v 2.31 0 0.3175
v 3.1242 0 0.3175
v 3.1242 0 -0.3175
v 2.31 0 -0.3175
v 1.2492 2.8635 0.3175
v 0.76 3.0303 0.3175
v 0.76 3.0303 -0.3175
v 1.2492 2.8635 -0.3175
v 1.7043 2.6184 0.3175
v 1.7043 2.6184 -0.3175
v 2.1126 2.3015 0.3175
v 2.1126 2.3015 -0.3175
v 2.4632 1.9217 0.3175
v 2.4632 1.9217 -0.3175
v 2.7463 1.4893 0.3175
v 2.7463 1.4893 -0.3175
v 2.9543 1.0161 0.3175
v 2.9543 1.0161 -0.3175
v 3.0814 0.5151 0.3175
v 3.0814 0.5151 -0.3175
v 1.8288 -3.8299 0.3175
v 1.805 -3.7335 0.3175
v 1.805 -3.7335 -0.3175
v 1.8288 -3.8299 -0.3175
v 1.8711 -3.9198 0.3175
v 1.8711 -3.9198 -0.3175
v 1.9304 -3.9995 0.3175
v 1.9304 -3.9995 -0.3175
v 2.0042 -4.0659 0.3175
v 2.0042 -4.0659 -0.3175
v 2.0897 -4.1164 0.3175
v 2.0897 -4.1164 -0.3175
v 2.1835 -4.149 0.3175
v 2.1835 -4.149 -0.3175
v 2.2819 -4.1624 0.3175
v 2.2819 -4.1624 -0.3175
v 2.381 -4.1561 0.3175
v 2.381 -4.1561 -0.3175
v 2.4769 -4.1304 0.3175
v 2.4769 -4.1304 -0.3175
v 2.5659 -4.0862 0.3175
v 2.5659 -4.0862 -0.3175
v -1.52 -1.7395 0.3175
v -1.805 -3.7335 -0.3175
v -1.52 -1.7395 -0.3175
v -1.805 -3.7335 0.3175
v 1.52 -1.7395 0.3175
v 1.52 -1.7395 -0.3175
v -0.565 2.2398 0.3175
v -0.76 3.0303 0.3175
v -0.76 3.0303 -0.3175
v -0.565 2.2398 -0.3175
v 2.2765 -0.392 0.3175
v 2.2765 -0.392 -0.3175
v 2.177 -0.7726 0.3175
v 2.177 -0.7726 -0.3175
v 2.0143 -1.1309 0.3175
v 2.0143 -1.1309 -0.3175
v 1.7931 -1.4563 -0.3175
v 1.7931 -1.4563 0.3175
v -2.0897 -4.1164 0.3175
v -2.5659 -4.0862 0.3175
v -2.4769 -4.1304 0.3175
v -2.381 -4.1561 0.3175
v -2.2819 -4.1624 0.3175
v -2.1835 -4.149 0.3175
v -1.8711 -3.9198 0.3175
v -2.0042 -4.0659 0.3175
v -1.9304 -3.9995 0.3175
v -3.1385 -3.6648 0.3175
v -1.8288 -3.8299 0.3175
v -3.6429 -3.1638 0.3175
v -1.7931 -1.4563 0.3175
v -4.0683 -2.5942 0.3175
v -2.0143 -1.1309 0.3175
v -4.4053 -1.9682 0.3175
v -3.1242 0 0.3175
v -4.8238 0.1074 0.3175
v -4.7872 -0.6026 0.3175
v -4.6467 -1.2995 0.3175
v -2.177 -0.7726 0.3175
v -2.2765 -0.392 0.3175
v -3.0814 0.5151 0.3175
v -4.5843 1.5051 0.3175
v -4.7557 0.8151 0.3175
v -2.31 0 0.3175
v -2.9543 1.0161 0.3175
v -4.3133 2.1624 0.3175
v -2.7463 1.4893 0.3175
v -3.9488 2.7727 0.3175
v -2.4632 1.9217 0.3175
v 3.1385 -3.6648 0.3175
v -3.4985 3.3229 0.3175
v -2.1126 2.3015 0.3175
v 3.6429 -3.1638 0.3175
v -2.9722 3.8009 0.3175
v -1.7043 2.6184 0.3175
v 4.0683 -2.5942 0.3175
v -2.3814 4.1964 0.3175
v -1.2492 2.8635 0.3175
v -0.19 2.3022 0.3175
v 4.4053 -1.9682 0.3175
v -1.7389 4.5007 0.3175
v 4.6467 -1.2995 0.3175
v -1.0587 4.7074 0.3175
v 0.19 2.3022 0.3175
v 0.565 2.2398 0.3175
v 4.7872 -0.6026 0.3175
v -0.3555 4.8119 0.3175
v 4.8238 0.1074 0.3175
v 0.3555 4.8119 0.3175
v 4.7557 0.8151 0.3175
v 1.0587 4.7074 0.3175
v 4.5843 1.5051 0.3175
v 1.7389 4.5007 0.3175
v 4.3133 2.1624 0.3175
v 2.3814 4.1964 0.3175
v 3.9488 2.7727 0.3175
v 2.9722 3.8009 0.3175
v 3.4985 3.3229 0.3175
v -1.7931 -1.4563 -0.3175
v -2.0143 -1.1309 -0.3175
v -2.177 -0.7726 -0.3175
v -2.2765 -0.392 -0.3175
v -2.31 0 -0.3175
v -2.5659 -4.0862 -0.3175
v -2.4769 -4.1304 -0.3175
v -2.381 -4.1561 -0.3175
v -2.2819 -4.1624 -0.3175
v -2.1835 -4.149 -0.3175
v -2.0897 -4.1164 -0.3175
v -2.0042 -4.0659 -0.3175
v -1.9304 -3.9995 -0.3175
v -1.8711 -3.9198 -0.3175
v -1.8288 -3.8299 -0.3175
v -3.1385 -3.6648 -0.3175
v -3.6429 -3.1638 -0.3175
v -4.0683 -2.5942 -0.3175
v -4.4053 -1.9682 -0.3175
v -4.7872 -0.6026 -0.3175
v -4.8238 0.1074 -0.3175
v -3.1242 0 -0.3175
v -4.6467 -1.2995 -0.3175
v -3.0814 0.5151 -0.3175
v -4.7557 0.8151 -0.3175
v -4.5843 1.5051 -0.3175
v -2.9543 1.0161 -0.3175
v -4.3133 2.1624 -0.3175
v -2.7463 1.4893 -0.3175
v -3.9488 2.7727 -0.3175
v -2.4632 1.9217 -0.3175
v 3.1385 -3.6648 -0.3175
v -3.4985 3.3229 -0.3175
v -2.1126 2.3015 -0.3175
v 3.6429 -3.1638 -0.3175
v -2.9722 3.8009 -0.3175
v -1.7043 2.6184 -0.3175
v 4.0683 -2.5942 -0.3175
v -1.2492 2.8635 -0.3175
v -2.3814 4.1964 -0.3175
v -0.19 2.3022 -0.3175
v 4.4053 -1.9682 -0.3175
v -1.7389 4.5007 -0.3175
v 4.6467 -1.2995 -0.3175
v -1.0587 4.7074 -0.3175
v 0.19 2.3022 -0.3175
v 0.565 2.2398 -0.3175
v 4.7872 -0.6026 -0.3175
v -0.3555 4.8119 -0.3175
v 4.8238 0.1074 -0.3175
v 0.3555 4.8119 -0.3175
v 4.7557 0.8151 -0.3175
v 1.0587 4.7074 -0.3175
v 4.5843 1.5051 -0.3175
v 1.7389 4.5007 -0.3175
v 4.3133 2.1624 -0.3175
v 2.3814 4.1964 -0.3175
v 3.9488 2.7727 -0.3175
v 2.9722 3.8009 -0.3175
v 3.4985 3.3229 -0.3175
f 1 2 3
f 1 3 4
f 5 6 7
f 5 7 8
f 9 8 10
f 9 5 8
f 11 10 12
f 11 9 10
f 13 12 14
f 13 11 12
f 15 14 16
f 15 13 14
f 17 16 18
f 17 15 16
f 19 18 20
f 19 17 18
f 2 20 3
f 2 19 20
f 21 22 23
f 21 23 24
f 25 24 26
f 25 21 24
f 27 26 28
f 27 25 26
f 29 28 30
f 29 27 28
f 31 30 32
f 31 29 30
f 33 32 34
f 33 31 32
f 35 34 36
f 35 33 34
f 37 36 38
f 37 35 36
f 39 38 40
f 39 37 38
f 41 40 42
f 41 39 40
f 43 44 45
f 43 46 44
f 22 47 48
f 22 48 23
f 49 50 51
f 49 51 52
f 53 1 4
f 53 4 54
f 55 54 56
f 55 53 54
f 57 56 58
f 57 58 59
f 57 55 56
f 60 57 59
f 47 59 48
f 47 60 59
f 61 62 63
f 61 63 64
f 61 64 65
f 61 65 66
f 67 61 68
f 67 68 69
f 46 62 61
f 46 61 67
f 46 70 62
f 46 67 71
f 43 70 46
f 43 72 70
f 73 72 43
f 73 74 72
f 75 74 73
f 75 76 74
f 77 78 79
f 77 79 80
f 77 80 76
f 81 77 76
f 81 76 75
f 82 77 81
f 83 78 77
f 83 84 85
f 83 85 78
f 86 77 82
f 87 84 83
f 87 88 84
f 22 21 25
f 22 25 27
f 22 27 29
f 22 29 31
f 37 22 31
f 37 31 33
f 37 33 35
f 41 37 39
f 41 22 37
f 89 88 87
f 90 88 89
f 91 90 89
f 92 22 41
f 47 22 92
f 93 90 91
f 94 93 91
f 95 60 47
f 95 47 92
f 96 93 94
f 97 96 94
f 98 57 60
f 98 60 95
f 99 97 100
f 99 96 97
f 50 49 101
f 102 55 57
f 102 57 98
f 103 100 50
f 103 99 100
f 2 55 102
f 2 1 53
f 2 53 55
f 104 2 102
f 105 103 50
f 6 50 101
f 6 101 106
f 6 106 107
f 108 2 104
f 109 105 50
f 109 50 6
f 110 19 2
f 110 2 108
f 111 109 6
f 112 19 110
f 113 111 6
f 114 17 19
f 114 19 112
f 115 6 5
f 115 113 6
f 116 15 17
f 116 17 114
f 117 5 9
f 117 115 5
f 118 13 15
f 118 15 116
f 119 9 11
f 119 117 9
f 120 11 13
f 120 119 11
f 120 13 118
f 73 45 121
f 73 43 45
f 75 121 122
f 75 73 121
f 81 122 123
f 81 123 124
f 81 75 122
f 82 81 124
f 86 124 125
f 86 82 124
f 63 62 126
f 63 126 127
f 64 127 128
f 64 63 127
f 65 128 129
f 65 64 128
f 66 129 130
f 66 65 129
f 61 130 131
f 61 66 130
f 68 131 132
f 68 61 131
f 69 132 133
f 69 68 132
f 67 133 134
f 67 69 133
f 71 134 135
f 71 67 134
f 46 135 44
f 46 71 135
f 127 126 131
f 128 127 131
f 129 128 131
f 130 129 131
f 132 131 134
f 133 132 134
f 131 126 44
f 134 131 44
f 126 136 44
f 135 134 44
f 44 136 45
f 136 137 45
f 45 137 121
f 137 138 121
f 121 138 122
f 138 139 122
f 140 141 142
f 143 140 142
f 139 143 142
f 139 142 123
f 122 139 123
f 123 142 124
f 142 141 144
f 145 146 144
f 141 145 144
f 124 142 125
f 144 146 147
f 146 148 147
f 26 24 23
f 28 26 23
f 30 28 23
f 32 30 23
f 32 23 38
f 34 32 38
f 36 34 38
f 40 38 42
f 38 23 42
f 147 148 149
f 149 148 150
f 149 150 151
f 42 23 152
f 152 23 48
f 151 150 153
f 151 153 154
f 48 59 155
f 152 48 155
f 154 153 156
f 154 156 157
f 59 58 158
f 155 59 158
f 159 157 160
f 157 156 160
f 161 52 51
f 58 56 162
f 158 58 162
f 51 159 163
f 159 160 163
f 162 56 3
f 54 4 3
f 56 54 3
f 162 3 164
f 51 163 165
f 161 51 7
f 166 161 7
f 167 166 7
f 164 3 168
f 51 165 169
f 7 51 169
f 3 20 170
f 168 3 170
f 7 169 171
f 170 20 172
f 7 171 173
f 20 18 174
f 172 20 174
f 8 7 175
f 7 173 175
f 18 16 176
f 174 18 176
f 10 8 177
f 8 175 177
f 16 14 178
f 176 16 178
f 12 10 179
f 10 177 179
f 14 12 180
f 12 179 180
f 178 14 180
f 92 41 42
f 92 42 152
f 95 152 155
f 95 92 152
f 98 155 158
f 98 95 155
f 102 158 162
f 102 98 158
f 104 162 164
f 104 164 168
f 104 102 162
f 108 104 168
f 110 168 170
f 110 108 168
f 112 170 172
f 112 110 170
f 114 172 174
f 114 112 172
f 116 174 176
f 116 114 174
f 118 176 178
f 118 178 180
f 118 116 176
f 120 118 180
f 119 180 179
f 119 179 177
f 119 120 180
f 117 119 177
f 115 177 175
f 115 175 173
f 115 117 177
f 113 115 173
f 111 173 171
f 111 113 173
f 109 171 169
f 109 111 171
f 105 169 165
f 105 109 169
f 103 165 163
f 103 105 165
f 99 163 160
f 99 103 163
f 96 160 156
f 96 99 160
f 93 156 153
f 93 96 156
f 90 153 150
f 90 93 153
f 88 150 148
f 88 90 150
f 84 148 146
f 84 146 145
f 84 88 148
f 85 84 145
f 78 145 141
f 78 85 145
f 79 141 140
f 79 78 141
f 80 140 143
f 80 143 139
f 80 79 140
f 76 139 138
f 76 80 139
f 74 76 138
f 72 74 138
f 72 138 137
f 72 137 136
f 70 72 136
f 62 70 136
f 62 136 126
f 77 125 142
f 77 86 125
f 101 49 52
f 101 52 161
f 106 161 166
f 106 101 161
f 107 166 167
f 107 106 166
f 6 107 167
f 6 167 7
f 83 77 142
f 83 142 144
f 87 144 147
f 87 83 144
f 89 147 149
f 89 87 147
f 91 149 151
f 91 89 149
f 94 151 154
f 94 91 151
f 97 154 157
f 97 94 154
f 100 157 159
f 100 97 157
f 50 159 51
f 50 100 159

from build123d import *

# Parameters (mm, degrees)
BOSS_EXTRUDE1_DEPTH = 0.3175


with BuildPart() as part:
    # Sketch1 → Boss-Extrude1 (new body, symmetric)
    with BuildSketch(Plane.XY):
        with BuildLine():
            Line((-2.31, 0), (-3.124160712, 0))
            ThreePointArc((-3.124160712, 0), (-2.463203432, 1.921720325), (-0.76, 3.030310241))
            Line((-0.76, 3.030310241), (-0.565, 2.239838164))
            ThreePointArc((-0.565, 2.239838164), (0, 2.31), (0.565, 2.239838164))
            Line((0.565, 2.239838164), (0.76, 3.030310241))
            ThreePointArc((0.76, 3.030310241), (2.463203432, 1.921720325), (3.124160712, 0))
            Line((3.124160712, 0), (2.31, 0))
            ThreePointArc((2.31, 0), (2.103247489, -0.955222487), (1.52, -1.739453937))
            Line((1.52, -1.739453937), (1.80501504, -3.733492135))
            ThreePointArc((1.80501504, -3.733492135), (2.089707078, -4.11637794), (2.565878648, -4.086183031))
            ThreePointArc((2.565878648, -4.086183031), (0, 4.825), (-2.565878648, -4.086183031))
            ThreePointArc((-2.565878648, -4.086183031), (-2.089707078, -4.11637794), (-1.80501504, -3.733492135))
            Line((-1.80501504, -3.733492135), (-1.52, -1.739453937))
            ThreePointArc((-1.52, -1.739453937), (-2.103247489, -0.955222487), (-2.31, 0))
        make_face()
    extrude(amount=BOSS_EXTRUDE1_DEPTH, both=True)


solid = part.part
